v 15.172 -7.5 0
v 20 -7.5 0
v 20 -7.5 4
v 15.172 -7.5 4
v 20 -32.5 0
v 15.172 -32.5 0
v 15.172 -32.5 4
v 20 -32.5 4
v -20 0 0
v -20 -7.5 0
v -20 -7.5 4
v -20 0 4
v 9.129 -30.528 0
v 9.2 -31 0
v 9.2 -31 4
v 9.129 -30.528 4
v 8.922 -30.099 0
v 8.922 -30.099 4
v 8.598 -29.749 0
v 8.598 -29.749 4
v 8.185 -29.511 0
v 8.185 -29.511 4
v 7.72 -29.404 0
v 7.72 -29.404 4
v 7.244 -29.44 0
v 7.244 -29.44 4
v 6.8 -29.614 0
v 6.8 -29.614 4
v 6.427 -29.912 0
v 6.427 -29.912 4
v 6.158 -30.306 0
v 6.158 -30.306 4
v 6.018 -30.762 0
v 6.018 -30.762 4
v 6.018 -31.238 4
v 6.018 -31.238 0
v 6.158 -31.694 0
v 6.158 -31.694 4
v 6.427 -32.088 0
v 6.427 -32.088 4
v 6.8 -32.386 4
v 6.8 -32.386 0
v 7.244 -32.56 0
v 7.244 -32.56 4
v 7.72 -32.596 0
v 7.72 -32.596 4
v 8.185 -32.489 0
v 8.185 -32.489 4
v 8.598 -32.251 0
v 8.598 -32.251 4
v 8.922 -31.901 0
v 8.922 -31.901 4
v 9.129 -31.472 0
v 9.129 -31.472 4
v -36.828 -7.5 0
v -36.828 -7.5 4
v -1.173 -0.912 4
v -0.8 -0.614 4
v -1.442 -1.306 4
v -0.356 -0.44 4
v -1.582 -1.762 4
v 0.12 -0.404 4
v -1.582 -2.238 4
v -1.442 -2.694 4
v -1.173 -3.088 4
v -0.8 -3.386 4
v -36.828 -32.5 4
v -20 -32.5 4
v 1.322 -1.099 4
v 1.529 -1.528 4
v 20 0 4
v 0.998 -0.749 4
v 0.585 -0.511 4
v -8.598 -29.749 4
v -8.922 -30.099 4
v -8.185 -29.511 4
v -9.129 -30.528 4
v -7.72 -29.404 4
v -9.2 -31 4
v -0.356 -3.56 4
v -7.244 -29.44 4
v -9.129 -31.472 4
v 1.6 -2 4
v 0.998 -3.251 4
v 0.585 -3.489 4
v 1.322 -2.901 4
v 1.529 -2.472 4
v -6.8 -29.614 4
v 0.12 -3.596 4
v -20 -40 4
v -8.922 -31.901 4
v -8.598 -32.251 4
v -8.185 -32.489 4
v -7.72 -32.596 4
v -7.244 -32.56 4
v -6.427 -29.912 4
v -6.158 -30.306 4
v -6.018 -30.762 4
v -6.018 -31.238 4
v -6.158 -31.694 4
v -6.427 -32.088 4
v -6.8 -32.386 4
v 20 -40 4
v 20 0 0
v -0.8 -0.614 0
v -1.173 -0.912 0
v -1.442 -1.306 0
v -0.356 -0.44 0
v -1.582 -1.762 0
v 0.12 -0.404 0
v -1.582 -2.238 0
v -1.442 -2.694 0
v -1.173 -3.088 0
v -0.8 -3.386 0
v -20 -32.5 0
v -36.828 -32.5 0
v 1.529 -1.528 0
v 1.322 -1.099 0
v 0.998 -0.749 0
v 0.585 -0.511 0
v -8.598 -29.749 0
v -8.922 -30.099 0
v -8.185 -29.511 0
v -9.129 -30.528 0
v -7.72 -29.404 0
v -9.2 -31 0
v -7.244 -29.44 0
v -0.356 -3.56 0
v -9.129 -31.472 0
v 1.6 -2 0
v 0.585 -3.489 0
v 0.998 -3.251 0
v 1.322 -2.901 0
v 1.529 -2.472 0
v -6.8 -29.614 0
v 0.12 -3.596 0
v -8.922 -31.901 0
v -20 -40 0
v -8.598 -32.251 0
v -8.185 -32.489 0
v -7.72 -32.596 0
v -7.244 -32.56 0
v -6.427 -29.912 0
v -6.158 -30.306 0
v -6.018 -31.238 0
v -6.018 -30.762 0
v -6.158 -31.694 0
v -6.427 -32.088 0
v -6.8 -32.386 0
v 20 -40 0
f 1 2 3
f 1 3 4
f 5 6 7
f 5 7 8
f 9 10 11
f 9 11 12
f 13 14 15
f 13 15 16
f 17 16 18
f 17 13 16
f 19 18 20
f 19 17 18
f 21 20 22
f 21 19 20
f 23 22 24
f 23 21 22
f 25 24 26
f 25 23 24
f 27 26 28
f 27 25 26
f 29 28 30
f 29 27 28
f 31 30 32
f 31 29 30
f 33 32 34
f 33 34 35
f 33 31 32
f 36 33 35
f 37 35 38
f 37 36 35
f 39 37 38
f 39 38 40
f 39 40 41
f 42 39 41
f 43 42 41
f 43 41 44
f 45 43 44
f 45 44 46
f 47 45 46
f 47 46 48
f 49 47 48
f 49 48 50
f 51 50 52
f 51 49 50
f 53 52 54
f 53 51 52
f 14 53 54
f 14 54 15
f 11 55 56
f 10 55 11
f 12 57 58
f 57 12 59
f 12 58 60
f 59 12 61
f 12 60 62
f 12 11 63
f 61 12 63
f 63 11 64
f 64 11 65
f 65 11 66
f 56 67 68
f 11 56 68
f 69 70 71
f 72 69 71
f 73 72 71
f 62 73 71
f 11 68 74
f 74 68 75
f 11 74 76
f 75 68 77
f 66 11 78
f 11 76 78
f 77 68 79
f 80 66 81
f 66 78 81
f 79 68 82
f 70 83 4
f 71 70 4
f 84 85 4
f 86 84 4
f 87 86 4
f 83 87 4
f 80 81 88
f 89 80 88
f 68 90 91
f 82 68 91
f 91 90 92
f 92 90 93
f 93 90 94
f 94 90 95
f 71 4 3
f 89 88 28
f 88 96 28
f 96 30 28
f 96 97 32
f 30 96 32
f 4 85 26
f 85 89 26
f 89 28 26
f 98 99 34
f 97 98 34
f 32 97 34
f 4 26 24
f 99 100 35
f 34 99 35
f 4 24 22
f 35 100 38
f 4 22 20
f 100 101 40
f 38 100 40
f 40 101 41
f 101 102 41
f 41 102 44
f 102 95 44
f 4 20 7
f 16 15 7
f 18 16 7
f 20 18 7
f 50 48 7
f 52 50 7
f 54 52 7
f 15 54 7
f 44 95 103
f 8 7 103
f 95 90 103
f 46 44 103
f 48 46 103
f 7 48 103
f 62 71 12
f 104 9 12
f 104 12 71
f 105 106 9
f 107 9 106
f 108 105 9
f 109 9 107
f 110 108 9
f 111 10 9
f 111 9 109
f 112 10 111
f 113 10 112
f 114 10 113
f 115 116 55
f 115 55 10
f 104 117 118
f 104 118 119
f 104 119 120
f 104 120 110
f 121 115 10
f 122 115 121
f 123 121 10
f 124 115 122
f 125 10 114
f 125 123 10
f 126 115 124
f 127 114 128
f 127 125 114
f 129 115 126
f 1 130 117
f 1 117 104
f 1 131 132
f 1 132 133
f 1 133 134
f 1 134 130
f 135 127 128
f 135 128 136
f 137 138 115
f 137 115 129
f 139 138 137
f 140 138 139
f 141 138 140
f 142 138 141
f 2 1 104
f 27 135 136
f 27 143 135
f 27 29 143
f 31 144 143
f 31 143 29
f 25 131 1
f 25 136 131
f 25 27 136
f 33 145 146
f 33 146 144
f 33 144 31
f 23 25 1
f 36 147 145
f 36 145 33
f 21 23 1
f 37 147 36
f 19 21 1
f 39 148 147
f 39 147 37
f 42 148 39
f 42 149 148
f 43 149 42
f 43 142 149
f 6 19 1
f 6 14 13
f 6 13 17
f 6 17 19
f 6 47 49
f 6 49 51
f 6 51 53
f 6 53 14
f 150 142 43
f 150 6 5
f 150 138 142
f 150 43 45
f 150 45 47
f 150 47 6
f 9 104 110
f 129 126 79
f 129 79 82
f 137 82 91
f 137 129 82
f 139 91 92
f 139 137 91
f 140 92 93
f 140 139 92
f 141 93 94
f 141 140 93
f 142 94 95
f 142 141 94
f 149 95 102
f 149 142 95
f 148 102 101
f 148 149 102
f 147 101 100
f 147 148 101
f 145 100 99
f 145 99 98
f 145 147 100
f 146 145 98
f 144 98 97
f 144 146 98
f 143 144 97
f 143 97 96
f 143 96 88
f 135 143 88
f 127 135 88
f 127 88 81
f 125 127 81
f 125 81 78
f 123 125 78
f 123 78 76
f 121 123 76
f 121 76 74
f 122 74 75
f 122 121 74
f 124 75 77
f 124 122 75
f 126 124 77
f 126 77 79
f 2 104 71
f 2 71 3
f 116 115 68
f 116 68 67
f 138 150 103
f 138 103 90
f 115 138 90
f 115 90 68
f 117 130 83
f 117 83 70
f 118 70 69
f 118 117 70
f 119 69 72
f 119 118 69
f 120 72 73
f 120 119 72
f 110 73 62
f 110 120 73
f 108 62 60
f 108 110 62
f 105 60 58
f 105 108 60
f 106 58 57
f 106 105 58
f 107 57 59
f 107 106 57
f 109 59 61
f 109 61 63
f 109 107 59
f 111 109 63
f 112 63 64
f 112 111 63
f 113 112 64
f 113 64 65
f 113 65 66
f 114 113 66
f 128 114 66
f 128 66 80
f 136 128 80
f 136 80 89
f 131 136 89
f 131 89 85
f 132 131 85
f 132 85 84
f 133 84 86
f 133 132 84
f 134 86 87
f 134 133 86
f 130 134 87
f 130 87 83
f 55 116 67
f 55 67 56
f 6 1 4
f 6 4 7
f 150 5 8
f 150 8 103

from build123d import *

# Parameters (mm, degrees)
SKETCH1_R           = 1.6
BOSS_EXTRUDE1_DEPTH = 4


with BuildPart() as part:
    # Sketch1 → Boss-Extrude1 (new body)
    with BuildSketch(Plane(origin=(0, 0, 0), x_dir=(-1, 0, 0), z_dir=(0, 0, 1))):
        Polygon((-20, 40), (20, 40), (20, 32.5), (36.828427125, 32.5), (36.828427125, 7.5), (20, 7.5), (20, 0), (-20, 0), (-20, 7.5), (-15.171572875, 7.5), (-15.171572875, 32.5), (-20, 32.5), align=None)
        with Locations(Location((-7.6, 31, 0), (0, 0, 180))):
            Circle(SKETCH1_R, mode=Mode.SUBTRACT)
        with Locations((7.6, 31)):
            Circle(SKETCH1_R, mode=Mode.SUBTRACT)
        with Locations(Location((0, 2, 0), (0, 0, 180))):
            Circle(SKETCH1_R, mode=Mode.SUBTRACT)
    extrude(amount=BOSS_EXTRUDE1_DEPTH)


solid = part.part
